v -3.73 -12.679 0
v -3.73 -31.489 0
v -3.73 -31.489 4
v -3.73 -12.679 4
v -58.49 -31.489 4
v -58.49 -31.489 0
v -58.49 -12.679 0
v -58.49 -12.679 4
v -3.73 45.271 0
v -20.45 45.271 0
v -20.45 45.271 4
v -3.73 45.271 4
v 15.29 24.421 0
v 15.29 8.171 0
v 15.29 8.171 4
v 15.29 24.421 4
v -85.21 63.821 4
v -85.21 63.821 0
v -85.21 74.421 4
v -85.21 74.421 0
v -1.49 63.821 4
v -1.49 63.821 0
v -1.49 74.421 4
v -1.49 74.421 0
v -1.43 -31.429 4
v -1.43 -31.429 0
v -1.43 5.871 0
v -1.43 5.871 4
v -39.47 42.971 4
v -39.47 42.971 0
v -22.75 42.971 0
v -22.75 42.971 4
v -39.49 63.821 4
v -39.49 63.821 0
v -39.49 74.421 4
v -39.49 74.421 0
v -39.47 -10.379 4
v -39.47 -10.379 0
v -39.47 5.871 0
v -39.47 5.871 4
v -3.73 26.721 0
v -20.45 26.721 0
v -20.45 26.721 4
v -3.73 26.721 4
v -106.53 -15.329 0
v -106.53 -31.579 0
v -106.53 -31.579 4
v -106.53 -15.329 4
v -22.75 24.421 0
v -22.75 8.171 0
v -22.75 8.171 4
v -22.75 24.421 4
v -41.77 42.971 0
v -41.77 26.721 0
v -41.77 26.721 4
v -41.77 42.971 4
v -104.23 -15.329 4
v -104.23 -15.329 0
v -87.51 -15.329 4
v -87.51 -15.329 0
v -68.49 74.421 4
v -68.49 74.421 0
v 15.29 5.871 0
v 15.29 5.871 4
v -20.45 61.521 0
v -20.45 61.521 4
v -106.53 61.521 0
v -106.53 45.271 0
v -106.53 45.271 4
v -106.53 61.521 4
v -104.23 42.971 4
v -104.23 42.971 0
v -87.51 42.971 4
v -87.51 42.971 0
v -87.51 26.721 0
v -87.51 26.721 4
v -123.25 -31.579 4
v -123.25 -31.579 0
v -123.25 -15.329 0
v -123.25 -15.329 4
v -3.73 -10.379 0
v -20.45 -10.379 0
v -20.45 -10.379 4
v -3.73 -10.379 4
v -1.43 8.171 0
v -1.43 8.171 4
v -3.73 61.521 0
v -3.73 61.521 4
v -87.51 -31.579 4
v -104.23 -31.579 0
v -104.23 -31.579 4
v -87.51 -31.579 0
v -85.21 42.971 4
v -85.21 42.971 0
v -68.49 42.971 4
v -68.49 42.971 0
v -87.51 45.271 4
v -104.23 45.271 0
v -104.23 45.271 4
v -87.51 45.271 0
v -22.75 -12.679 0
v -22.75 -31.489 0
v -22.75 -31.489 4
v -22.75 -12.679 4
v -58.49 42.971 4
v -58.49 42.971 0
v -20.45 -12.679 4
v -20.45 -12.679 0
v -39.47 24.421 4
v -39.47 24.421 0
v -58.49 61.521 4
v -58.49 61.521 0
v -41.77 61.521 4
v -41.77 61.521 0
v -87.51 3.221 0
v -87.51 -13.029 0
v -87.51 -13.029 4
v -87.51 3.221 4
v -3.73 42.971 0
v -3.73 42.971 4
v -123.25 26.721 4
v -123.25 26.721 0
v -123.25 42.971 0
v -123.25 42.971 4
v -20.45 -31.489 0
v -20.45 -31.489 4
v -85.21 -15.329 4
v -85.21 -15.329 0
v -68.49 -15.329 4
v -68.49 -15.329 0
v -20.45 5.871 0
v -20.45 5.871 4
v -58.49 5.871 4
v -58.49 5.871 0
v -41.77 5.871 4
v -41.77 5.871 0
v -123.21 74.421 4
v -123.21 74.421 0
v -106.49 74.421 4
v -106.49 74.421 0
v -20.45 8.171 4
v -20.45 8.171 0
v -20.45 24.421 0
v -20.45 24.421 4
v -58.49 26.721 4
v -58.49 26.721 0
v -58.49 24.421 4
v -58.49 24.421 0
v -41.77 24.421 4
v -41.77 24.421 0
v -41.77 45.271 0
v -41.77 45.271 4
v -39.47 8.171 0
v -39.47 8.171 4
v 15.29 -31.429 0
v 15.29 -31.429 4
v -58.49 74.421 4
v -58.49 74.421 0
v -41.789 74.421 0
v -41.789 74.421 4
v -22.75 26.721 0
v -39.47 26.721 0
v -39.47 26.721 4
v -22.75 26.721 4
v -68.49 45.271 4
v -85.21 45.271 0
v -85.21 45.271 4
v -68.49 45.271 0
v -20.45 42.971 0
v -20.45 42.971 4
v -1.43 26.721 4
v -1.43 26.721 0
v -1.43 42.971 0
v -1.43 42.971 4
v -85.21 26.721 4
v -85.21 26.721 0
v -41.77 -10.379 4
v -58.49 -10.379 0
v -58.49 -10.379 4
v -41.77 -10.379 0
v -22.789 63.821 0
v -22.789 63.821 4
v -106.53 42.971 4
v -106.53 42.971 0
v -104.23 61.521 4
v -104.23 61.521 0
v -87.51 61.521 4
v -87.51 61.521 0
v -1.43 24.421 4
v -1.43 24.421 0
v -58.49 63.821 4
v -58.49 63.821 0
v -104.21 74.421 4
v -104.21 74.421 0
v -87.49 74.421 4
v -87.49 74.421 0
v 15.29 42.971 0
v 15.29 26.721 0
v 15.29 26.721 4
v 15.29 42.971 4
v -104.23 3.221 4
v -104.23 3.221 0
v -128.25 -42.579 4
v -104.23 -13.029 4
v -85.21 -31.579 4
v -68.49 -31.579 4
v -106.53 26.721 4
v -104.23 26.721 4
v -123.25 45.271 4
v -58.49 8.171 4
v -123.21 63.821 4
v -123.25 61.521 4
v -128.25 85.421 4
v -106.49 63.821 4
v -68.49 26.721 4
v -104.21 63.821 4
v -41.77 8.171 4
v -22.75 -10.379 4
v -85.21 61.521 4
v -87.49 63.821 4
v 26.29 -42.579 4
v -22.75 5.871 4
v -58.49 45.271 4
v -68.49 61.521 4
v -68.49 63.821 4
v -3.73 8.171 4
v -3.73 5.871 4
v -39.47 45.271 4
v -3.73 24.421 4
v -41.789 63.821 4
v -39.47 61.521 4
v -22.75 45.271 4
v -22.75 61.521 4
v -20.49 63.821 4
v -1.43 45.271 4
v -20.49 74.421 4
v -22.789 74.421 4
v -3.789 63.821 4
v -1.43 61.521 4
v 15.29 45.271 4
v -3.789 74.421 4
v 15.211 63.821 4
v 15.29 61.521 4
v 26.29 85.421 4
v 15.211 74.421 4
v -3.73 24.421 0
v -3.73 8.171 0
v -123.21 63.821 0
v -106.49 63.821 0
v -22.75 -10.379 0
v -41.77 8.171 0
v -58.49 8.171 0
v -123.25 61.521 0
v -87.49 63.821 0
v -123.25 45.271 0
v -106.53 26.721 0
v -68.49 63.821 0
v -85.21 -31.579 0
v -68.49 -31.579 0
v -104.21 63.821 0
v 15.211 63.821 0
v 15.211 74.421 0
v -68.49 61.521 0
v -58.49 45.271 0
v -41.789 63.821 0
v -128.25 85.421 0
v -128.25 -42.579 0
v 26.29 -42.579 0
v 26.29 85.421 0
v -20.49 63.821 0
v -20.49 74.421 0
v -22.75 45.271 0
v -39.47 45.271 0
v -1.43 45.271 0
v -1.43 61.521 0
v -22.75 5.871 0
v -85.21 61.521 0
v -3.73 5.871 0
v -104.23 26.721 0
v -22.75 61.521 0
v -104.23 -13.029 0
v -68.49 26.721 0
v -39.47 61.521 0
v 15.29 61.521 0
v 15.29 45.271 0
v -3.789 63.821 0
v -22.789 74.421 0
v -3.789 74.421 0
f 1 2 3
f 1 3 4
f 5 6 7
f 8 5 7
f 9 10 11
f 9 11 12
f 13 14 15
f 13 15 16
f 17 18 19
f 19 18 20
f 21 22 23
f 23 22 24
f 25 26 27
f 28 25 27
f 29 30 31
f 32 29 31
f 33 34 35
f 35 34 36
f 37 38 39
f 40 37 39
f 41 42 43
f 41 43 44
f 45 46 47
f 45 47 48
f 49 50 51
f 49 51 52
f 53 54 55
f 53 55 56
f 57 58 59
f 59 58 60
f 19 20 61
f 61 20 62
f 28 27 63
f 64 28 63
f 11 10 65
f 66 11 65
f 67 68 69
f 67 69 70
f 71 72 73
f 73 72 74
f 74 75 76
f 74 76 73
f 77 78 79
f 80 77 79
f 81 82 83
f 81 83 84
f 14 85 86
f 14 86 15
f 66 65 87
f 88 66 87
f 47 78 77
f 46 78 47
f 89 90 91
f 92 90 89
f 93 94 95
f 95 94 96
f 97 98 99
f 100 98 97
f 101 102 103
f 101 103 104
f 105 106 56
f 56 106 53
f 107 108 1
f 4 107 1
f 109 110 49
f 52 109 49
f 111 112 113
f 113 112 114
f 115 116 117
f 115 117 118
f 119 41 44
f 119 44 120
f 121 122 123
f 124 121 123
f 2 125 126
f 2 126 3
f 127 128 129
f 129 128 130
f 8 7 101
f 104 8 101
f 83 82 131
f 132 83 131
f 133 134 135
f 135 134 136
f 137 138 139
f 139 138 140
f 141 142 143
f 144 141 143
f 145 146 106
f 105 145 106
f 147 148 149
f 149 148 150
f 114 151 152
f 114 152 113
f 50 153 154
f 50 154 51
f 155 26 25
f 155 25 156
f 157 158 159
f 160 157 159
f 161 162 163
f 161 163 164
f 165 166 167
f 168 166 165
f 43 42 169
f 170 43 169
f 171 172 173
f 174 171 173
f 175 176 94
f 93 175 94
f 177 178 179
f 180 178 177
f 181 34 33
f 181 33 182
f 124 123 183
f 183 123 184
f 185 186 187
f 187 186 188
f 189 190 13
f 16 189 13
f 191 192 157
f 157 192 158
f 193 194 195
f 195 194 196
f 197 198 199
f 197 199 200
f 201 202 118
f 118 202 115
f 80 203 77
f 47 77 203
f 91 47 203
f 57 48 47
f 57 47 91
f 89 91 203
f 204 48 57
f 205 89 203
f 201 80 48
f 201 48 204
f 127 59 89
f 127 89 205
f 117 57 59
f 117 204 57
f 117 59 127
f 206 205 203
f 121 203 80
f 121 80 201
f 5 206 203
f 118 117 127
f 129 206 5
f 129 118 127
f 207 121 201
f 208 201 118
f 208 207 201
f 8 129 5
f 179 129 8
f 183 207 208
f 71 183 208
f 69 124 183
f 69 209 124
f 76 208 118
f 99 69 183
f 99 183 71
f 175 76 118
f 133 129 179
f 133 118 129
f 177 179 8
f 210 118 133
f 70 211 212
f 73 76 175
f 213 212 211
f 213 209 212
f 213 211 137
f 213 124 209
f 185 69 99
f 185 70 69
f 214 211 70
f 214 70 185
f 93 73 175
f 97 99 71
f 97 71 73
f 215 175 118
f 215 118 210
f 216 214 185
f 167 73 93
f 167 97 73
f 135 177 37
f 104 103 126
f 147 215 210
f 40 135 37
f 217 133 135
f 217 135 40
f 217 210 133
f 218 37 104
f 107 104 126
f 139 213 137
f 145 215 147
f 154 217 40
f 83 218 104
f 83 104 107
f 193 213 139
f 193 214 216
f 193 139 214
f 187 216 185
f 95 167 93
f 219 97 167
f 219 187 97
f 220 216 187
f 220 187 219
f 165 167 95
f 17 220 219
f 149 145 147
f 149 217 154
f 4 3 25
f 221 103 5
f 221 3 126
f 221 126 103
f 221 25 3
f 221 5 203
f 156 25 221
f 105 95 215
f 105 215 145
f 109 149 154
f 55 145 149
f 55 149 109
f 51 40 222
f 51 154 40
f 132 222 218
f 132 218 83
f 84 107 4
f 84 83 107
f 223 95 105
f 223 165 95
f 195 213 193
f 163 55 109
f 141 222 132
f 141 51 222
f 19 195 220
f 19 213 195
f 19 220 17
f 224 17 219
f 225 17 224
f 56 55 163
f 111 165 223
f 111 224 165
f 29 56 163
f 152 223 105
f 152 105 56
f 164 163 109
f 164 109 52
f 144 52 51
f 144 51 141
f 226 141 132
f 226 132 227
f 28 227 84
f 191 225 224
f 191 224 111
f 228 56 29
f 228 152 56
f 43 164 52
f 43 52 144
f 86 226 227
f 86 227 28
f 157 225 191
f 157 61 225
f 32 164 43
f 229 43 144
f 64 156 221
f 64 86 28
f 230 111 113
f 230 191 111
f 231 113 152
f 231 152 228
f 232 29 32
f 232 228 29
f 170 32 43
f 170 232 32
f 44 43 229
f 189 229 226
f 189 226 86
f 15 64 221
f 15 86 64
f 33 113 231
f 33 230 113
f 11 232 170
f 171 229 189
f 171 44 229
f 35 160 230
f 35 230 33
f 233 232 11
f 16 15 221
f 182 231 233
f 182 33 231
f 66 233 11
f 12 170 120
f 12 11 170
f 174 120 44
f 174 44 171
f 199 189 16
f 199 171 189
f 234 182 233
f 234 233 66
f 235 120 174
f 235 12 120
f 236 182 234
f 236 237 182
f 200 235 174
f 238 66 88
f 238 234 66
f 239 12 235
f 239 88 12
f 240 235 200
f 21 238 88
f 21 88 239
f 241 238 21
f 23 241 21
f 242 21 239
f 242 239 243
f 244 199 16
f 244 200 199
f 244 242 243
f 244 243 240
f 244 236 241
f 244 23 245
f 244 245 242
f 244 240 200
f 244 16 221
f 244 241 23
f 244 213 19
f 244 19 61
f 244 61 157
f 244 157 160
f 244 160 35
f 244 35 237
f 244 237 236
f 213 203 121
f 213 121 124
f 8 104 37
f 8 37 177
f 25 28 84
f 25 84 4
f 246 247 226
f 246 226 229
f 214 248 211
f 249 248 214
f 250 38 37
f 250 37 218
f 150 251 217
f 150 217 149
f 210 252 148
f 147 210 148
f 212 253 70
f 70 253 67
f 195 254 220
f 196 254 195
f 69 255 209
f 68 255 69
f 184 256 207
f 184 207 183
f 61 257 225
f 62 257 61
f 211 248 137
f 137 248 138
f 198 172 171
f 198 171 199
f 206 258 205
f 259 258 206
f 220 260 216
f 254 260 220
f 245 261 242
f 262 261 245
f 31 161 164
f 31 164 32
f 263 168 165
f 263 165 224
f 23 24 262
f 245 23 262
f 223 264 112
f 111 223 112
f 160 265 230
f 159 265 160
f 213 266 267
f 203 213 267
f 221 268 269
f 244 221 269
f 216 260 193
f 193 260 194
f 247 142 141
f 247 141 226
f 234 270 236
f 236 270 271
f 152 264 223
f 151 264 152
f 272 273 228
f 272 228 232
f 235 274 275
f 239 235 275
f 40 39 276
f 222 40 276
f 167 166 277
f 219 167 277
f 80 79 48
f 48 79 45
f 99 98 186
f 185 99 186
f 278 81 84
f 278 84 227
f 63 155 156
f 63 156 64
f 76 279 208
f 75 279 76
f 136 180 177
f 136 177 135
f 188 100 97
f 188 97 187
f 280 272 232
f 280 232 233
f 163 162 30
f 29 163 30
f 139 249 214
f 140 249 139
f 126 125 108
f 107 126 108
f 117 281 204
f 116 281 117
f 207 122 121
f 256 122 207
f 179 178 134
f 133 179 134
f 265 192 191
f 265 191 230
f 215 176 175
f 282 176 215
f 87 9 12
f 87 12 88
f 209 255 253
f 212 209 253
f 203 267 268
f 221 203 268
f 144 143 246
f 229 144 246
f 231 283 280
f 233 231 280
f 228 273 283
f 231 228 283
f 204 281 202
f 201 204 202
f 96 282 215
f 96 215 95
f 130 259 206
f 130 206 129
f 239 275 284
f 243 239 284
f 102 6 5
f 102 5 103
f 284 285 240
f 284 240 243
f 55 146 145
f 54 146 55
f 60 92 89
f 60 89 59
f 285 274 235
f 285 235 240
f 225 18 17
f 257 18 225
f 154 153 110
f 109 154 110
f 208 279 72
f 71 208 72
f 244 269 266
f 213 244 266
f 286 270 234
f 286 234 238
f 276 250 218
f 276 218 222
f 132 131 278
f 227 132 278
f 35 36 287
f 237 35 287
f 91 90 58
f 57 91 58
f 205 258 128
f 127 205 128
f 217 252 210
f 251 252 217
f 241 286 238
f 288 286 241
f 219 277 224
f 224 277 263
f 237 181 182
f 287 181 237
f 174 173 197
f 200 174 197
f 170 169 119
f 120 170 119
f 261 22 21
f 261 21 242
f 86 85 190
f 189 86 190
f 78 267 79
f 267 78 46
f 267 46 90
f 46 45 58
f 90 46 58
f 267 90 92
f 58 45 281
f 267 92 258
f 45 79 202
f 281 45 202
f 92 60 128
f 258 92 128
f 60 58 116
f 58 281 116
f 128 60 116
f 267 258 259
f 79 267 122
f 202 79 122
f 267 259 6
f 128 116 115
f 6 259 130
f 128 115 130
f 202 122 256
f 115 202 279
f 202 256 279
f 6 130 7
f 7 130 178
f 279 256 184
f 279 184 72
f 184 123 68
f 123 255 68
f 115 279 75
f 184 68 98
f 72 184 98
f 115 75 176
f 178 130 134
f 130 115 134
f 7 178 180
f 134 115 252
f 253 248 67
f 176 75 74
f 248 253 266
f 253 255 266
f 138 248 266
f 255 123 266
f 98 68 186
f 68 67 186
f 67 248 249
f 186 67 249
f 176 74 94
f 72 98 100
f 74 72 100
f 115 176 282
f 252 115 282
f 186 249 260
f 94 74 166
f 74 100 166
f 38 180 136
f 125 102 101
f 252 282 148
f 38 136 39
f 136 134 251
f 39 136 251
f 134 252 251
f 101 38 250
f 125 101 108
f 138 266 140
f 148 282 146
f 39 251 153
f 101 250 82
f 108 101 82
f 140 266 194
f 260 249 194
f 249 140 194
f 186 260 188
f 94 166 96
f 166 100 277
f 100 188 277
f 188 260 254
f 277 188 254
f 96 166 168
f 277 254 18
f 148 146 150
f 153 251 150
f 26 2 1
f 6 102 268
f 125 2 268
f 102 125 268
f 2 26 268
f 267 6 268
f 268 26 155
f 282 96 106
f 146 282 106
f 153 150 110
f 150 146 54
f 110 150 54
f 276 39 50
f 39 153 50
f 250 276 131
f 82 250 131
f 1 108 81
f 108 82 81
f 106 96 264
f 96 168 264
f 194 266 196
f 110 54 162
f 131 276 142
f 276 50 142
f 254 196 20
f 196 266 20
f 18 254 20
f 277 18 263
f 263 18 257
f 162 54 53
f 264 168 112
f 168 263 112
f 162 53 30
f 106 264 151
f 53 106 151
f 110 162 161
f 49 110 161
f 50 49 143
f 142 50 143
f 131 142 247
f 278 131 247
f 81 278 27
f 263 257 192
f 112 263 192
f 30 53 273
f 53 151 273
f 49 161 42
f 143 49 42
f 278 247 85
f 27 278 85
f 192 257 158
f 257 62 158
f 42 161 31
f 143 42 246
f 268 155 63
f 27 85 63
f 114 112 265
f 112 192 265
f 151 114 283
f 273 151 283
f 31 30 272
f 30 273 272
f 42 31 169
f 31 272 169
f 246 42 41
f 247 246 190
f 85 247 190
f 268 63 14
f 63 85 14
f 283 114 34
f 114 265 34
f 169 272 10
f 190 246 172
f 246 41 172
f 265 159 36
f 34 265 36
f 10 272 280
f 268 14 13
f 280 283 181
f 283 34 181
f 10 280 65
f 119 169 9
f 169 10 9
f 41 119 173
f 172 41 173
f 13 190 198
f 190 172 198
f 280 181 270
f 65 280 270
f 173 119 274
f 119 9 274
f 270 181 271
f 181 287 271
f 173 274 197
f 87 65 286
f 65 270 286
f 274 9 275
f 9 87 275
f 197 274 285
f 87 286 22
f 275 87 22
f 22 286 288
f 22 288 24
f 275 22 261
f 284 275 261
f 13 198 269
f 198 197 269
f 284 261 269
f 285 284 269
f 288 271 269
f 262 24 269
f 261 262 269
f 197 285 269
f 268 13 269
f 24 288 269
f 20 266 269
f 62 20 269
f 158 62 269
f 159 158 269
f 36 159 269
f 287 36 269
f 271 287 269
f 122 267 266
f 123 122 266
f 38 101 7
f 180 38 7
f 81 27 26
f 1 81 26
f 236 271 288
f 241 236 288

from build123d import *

# Parameters (mm, degrees)
F0_W     = 16.72
F0_H     = 16.25
F0_W_2   = 35.74
F0_H_2   = 18.81
F0_H_3   = 37.3
F0_H_4   = 10.6
F0_W_3   = 16.7007
F1_DEPTH = 4


with BuildPart() as f1:
    # F0 (on Top) → F1 (new body)
    with BuildSketch(Plane.XY):
        Polygon((26.290441, -42.578733), (26.290441, 85.421267), (-128.249559, 85.421267), (-128.249559, 78.421267), (-128.249559, -35.578733), (-128.249559, -42.578733), align=None)
        with Locations((-114.889559, -23.453733)):
            Rectangle(F0_W, F0_H, mode=Mode.SUBTRACT)
        with Locations((-95.869559, -23.453733)):
            Rectangle(F0_W, F0_H, mode=Mode.SUBTRACT)
        with Locations((-76.849559, -23.453733)):
            Rectangle(F0_W, F0_H, mode=Mode.SUBTRACT)
        with Locations((-95.869559, -4.903733)):
            Rectangle(F0_W, F0_H, mode=Mode.SUBTRACT)
        with Locations((-40.619559, -22.083733)):
            Rectangle(F0_W_2, F0_H_2, mode=Mode.SUBTRACT)
        with Locations((-12.089559, -22.083733)):
            Rectangle(F0_W, F0_H_2, mode=Mode.SUBTRACT)
        with Locations((6.930441, -12.778733)):
            Rectangle(F0_W, F0_H_3, mode=Mode.SUBTRACT)
        with Locations((-50.129559, -2.253733)):
            Rectangle(F0_W, F0_H, mode=Mode.SUBTRACT)
        with Locations((-31.109559, -2.253733)):
            Rectangle(F0_W, F0_H, mode=Mode.SUBTRACT)
        with Locations((-50.129559, 16.296267)):
            Rectangle(F0_W, F0_H, mode=Mode.SUBTRACT)
        with Locations((-31.109559, 16.296267)):
            Rectangle(F0_W, F0_H, mode=Mode.SUBTRACT)
        with Locations((-12.089559, -2.253733)):
            Rectangle(F0_W, F0_H, mode=Mode.SUBTRACT)
        with Locations((-12.089559, 16.296267)):
            Rectangle(F0_W, F0_H, mode=Mode.SUBTRACT)
        with Locations((6.930441, 16.296267)):
            Rectangle(F0_W, F0_H, mode=Mode.SUBTRACT)
        with Locations((-114.889559, 34.846267)):
            Rectangle(F0_W, F0_H, mode=Mode.SUBTRACT)
        with Locations((-95.869559, 34.846267)):
            Rectangle(F0_W, F0_H, mode=Mode.SUBTRACT)
        with Locations((-114.889559, 53.396267)):
            Rectangle(F0_W, F0_H, mode=Mode.SUBTRACT)
        with Locations((-95.869559, 53.396267)):
            Rectangle(F0_W, F0_H, mode=Mode.SUBTRACT)
        with Locations((-76.849559, 34.846267)):
            Rectangle(F0_W, F0_H, mode=Mode.SUBTRACT)
        with Locations((-76.849559, 53.396267)):
            Rectangle(F0_W, F0_H, mode=Mode.SUBTRACT)
        with Locations((-114.849559, 69.121267)):
            Rectangle(F0_W, F0_H_4, mode=Mode.SUBTRACT)
        with Locations((-95.849559, 69.121267)):
            Rectangle(F0_W, F0_H_4, mode=Mode.SUBTRACT)
        with Locations((-76.849559, 69.121267)):
            Rectangle(F0_W, F0_H_4, mode=Mode.SUBTRACT)
        with Locations((-50.129559, 34.846267)):
            Rectangle(F0_W, F0_H, mode=Mode.SUBTRACT)
        with Locations((-31.109559, 34.846267)):
            Rectangle(F0_W, F0_H, mode=Mode.SUBTRACT)
        with Locations((-50.129559, 53.396267)):
            Rectangle(F0_W, F0_H, mode=Mode.SUBTRACT)
        with Locations((-31.109559, 53.396267)):
            Rectangle(F0_W, F0_H, mode=Mode.SUBTRACT)
        with Locations((-12.089559, 34.846267)):
            Rectangle(F0_W, F0_H, mode=Mode.SUBTRACT)
        with Locations((6.930441, 34.846267)):
            Rectangle(F0_W, F0_H, mode=Mode.SUBTRACT)
        with Locations((-12.089559, 53.396267)):
            Rectangle(F0_W, F0_H, mode=Mode.SUBTRACT)
        with Locations((6.930441, 53.396267)):
            Rectangle(F0_W, F0_H, mode=Mode.SUBTRACT)
        with Locations((-50.139209, 69.121267)):
            Rectangle(F0_W_3, F0_H_4, mode=Mode.SUBTRACT)
        with Locations((-31.139209, 69.121267)):
            Rectangle(F0_W_3, F0_H_4, mode=Mode.SUBTRACT)
        with Locations((-12.139209, 69.121267)):
            Rectangle(F0_W_3, F0_H_4, mode=Mode.SUBTRACT)
        with Locations((6.860791, 69.121267)):
            Rectangle(F0_W_3, F0_H_4, mode=Mode.SUBTRACT)
    extrude(amount=F1_DEPTH)


solid = f1.part
